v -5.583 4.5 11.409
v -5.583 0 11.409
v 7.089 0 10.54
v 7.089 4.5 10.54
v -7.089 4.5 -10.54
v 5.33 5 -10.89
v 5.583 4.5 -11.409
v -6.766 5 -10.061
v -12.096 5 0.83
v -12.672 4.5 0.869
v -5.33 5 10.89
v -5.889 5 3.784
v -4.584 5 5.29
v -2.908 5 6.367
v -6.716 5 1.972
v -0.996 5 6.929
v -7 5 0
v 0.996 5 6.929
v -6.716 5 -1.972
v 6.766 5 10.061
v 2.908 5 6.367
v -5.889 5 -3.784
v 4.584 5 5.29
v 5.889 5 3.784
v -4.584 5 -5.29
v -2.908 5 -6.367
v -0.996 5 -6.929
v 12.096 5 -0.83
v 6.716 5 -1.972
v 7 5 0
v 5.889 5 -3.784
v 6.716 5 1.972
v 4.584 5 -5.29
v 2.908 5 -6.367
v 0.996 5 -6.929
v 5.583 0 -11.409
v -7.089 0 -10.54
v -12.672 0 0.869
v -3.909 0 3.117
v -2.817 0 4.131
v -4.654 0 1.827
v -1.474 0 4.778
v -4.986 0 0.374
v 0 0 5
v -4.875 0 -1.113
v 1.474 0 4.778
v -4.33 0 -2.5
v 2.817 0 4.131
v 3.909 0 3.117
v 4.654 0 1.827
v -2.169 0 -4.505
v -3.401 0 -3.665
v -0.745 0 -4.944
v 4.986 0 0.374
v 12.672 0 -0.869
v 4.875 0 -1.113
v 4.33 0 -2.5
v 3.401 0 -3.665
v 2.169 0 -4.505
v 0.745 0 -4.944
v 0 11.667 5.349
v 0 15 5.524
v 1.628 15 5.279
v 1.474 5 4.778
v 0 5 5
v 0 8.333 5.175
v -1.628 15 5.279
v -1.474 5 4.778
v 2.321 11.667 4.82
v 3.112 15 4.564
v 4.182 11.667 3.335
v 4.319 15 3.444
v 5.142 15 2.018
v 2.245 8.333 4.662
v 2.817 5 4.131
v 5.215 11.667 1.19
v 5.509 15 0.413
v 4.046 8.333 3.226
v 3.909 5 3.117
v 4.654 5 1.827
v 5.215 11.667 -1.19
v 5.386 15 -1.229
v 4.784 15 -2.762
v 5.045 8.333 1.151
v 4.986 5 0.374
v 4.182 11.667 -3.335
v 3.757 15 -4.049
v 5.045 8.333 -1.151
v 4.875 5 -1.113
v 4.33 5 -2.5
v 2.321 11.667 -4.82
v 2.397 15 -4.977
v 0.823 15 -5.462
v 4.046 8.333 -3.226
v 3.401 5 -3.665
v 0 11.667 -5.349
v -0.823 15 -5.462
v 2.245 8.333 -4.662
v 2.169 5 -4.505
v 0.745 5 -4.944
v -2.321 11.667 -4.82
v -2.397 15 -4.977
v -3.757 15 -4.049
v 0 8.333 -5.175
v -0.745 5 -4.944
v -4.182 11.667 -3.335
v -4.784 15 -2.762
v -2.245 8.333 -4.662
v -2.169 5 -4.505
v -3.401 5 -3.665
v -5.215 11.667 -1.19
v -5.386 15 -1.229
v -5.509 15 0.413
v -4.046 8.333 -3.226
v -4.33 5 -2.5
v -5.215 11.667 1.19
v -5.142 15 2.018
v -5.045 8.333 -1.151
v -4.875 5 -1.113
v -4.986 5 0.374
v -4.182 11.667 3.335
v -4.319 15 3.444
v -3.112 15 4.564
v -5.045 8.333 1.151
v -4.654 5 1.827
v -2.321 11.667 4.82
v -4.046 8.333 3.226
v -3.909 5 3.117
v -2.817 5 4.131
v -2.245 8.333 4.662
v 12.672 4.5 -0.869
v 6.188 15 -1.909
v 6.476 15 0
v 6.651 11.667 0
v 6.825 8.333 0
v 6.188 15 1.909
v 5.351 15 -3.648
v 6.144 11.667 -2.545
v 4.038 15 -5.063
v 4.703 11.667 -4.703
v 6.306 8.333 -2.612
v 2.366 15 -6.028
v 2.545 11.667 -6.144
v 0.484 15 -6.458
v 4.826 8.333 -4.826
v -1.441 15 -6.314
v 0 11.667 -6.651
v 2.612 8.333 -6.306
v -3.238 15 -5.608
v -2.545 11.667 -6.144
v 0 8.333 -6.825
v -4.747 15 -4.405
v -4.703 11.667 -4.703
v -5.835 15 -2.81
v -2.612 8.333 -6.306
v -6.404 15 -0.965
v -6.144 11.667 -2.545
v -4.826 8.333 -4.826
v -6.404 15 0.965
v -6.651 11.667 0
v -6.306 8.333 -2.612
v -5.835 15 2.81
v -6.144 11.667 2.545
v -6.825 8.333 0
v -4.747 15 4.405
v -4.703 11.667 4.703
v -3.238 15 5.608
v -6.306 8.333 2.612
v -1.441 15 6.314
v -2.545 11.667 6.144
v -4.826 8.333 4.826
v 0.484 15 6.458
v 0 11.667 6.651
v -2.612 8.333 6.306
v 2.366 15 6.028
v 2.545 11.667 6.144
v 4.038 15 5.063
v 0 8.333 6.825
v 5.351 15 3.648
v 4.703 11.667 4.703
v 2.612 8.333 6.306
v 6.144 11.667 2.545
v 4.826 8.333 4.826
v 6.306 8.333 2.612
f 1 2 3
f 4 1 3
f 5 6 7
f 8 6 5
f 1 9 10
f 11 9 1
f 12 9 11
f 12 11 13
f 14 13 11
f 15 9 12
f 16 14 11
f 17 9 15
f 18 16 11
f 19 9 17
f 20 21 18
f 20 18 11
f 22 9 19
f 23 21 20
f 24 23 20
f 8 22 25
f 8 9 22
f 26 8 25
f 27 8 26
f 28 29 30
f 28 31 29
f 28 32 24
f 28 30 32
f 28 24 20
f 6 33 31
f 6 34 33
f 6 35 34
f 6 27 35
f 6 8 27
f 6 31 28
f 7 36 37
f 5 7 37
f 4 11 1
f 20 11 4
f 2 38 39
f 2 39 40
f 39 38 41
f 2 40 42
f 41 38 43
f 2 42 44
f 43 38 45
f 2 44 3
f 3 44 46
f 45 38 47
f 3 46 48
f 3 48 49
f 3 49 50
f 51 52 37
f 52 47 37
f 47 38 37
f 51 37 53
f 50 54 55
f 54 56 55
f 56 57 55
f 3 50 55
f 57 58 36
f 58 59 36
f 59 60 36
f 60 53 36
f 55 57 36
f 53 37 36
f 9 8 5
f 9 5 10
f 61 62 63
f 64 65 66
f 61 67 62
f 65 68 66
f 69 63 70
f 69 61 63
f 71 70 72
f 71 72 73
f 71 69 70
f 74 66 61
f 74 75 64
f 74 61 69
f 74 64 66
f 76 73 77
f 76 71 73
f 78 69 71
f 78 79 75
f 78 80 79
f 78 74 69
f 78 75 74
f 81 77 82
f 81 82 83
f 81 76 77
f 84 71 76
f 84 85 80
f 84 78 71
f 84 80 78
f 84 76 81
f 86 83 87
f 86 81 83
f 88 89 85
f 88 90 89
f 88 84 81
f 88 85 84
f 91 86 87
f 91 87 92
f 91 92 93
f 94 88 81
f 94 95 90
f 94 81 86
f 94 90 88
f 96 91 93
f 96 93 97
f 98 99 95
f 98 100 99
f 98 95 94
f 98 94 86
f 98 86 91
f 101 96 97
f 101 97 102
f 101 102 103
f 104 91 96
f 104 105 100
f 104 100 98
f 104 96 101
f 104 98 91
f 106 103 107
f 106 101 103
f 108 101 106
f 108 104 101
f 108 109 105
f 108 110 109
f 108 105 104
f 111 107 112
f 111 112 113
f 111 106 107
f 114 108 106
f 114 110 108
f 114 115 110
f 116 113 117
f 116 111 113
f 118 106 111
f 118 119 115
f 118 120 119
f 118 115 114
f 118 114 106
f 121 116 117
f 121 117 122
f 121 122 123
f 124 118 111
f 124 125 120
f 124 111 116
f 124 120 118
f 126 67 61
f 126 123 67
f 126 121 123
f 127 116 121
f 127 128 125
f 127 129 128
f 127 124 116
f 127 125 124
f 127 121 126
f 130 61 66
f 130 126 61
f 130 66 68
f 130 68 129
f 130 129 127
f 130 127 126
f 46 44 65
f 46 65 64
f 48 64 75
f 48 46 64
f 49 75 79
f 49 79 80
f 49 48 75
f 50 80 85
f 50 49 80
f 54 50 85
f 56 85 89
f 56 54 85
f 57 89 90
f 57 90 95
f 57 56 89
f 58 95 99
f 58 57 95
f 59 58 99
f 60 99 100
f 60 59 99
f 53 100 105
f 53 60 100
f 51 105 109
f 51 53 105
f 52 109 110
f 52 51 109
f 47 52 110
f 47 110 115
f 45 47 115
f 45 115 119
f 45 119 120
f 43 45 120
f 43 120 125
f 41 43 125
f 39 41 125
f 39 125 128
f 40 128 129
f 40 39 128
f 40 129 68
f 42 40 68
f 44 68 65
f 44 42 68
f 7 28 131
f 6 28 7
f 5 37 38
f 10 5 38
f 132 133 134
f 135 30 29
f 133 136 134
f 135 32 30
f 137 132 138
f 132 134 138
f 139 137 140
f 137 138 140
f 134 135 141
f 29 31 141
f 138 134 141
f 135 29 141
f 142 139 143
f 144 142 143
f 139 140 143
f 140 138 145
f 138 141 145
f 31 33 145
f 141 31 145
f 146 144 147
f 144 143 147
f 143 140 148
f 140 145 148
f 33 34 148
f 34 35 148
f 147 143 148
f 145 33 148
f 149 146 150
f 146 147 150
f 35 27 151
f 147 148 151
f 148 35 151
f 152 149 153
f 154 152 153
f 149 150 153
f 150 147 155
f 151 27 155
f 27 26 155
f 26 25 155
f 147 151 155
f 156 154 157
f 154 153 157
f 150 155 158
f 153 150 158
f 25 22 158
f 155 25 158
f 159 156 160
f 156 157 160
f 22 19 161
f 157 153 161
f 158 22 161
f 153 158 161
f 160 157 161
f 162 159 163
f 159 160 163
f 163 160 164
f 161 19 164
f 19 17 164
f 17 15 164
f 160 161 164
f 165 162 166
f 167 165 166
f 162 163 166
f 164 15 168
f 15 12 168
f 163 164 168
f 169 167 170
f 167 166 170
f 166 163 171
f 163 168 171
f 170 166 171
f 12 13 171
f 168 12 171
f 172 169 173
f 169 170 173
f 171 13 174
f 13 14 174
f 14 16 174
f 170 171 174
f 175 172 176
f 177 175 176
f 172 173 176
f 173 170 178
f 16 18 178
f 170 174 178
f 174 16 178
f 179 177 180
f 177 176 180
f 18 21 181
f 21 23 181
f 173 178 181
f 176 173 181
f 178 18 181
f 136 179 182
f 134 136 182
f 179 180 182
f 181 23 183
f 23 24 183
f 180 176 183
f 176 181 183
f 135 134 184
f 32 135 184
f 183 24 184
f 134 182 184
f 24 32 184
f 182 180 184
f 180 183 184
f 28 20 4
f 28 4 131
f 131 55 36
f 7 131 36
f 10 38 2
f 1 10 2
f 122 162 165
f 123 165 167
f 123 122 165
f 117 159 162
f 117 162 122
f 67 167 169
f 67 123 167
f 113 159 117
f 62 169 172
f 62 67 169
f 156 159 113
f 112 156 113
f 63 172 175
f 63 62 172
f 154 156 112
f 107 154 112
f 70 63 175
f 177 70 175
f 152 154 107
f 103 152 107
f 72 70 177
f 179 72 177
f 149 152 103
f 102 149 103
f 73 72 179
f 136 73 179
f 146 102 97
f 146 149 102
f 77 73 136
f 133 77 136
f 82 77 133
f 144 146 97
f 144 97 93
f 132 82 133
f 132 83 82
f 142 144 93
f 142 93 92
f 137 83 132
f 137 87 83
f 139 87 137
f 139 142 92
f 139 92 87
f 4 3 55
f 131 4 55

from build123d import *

# Parameters (mm, degrees)
SKETCH1_R           = 5
BOSS_EXTRUDE1_DEPTH = 5
CHAMFER1_SIZE       = 0.5
SKETCH2_R           = 7
SKETCH2_R_2         = 5
BOSS_EXTRUDE2_DEPTH = 10
BOSS_EXTRUDE2_DRAFT = 3


with BuildPart() as part:
    # Sketch1 → Boss-Extrude1 (new body)
    with BuildSketch(Plane(origin=(0, 0, 0), x_dir=(1, 0, 0), z_dir=(0, 1, 0))):
        Polygon((7.08862867, -10.539671575), (12.671937667, 0.869096719), (5.583308997, 11.408768294), (-7.08862867, 10.539671575), (-12.671937667, -0.869096719), (-5.583308997, -11.408768294), align=None)
        with Locations(Location((0, 0, 0), (0, 0, 270))):
            Circle(SKETCH1_R, mode=Mode.SUBTRACT)
    extrude(amount=BOSS_EXTRUDE1_DEPTH)

    # Chamfer1
    chamfer1_edges = [part.edges().sort_by_distance(p)[0] for p in [
        (9.127623332, 5, -6.138932506),
        (-0.752659837, 5, -10.974219934),
        (-9.880283168, 5, -4.835287428),
        (-9.127623332, 5, 6.138932506),
        (0.752659837, 5, 10.974219934),
        (9.880283168, 5, 4.835287428),
    ]]
    chamfer(chamfer1_edges, length=CHAMFER1_SIZE)


with BuildPart() as boss_extrude2_tool:
    # Sketch2 → Boss-Extrude2 (with draft: the straight prism first)
    with BuildSketch(Plane(origin=(0, 5, 0), x_dir=(1, 0, 0), z_dir=(0, 1, 0))):
        Circle(SKETCH2_R)
        with Locations(Location((0, 0, 0), (0, 0, 270))):
            Circle(SKETCH2_R_2, mode=Mode.SUBTRACT)
    extrude(amount=BOSS_EXTRUDE2_DEPTH)
    # Boss-Extrude2: the draft: its side faces are tilted about the plane it starts from
    boss_extrude2_sides = [boss_extrude2_tool.faces().sort_by_distance(p)[0] for p in [
        (-7, 10, 0),
        (0, 10, -5),
    ]]
    draft(boss_extrude2_sides, Plane(origin=(0, 5, 0), x_dir=(1, 0, 0), z_dir=(0, 1, 0)), BOSS_EXTRUDE2_DRAFT)


with BuildPart() as part_1:
    add(part.part)

    # Boss-Extrude2: add boss_extrude2_tool
    add(boss_extrude2_tool.part)


solid = part_1.part
